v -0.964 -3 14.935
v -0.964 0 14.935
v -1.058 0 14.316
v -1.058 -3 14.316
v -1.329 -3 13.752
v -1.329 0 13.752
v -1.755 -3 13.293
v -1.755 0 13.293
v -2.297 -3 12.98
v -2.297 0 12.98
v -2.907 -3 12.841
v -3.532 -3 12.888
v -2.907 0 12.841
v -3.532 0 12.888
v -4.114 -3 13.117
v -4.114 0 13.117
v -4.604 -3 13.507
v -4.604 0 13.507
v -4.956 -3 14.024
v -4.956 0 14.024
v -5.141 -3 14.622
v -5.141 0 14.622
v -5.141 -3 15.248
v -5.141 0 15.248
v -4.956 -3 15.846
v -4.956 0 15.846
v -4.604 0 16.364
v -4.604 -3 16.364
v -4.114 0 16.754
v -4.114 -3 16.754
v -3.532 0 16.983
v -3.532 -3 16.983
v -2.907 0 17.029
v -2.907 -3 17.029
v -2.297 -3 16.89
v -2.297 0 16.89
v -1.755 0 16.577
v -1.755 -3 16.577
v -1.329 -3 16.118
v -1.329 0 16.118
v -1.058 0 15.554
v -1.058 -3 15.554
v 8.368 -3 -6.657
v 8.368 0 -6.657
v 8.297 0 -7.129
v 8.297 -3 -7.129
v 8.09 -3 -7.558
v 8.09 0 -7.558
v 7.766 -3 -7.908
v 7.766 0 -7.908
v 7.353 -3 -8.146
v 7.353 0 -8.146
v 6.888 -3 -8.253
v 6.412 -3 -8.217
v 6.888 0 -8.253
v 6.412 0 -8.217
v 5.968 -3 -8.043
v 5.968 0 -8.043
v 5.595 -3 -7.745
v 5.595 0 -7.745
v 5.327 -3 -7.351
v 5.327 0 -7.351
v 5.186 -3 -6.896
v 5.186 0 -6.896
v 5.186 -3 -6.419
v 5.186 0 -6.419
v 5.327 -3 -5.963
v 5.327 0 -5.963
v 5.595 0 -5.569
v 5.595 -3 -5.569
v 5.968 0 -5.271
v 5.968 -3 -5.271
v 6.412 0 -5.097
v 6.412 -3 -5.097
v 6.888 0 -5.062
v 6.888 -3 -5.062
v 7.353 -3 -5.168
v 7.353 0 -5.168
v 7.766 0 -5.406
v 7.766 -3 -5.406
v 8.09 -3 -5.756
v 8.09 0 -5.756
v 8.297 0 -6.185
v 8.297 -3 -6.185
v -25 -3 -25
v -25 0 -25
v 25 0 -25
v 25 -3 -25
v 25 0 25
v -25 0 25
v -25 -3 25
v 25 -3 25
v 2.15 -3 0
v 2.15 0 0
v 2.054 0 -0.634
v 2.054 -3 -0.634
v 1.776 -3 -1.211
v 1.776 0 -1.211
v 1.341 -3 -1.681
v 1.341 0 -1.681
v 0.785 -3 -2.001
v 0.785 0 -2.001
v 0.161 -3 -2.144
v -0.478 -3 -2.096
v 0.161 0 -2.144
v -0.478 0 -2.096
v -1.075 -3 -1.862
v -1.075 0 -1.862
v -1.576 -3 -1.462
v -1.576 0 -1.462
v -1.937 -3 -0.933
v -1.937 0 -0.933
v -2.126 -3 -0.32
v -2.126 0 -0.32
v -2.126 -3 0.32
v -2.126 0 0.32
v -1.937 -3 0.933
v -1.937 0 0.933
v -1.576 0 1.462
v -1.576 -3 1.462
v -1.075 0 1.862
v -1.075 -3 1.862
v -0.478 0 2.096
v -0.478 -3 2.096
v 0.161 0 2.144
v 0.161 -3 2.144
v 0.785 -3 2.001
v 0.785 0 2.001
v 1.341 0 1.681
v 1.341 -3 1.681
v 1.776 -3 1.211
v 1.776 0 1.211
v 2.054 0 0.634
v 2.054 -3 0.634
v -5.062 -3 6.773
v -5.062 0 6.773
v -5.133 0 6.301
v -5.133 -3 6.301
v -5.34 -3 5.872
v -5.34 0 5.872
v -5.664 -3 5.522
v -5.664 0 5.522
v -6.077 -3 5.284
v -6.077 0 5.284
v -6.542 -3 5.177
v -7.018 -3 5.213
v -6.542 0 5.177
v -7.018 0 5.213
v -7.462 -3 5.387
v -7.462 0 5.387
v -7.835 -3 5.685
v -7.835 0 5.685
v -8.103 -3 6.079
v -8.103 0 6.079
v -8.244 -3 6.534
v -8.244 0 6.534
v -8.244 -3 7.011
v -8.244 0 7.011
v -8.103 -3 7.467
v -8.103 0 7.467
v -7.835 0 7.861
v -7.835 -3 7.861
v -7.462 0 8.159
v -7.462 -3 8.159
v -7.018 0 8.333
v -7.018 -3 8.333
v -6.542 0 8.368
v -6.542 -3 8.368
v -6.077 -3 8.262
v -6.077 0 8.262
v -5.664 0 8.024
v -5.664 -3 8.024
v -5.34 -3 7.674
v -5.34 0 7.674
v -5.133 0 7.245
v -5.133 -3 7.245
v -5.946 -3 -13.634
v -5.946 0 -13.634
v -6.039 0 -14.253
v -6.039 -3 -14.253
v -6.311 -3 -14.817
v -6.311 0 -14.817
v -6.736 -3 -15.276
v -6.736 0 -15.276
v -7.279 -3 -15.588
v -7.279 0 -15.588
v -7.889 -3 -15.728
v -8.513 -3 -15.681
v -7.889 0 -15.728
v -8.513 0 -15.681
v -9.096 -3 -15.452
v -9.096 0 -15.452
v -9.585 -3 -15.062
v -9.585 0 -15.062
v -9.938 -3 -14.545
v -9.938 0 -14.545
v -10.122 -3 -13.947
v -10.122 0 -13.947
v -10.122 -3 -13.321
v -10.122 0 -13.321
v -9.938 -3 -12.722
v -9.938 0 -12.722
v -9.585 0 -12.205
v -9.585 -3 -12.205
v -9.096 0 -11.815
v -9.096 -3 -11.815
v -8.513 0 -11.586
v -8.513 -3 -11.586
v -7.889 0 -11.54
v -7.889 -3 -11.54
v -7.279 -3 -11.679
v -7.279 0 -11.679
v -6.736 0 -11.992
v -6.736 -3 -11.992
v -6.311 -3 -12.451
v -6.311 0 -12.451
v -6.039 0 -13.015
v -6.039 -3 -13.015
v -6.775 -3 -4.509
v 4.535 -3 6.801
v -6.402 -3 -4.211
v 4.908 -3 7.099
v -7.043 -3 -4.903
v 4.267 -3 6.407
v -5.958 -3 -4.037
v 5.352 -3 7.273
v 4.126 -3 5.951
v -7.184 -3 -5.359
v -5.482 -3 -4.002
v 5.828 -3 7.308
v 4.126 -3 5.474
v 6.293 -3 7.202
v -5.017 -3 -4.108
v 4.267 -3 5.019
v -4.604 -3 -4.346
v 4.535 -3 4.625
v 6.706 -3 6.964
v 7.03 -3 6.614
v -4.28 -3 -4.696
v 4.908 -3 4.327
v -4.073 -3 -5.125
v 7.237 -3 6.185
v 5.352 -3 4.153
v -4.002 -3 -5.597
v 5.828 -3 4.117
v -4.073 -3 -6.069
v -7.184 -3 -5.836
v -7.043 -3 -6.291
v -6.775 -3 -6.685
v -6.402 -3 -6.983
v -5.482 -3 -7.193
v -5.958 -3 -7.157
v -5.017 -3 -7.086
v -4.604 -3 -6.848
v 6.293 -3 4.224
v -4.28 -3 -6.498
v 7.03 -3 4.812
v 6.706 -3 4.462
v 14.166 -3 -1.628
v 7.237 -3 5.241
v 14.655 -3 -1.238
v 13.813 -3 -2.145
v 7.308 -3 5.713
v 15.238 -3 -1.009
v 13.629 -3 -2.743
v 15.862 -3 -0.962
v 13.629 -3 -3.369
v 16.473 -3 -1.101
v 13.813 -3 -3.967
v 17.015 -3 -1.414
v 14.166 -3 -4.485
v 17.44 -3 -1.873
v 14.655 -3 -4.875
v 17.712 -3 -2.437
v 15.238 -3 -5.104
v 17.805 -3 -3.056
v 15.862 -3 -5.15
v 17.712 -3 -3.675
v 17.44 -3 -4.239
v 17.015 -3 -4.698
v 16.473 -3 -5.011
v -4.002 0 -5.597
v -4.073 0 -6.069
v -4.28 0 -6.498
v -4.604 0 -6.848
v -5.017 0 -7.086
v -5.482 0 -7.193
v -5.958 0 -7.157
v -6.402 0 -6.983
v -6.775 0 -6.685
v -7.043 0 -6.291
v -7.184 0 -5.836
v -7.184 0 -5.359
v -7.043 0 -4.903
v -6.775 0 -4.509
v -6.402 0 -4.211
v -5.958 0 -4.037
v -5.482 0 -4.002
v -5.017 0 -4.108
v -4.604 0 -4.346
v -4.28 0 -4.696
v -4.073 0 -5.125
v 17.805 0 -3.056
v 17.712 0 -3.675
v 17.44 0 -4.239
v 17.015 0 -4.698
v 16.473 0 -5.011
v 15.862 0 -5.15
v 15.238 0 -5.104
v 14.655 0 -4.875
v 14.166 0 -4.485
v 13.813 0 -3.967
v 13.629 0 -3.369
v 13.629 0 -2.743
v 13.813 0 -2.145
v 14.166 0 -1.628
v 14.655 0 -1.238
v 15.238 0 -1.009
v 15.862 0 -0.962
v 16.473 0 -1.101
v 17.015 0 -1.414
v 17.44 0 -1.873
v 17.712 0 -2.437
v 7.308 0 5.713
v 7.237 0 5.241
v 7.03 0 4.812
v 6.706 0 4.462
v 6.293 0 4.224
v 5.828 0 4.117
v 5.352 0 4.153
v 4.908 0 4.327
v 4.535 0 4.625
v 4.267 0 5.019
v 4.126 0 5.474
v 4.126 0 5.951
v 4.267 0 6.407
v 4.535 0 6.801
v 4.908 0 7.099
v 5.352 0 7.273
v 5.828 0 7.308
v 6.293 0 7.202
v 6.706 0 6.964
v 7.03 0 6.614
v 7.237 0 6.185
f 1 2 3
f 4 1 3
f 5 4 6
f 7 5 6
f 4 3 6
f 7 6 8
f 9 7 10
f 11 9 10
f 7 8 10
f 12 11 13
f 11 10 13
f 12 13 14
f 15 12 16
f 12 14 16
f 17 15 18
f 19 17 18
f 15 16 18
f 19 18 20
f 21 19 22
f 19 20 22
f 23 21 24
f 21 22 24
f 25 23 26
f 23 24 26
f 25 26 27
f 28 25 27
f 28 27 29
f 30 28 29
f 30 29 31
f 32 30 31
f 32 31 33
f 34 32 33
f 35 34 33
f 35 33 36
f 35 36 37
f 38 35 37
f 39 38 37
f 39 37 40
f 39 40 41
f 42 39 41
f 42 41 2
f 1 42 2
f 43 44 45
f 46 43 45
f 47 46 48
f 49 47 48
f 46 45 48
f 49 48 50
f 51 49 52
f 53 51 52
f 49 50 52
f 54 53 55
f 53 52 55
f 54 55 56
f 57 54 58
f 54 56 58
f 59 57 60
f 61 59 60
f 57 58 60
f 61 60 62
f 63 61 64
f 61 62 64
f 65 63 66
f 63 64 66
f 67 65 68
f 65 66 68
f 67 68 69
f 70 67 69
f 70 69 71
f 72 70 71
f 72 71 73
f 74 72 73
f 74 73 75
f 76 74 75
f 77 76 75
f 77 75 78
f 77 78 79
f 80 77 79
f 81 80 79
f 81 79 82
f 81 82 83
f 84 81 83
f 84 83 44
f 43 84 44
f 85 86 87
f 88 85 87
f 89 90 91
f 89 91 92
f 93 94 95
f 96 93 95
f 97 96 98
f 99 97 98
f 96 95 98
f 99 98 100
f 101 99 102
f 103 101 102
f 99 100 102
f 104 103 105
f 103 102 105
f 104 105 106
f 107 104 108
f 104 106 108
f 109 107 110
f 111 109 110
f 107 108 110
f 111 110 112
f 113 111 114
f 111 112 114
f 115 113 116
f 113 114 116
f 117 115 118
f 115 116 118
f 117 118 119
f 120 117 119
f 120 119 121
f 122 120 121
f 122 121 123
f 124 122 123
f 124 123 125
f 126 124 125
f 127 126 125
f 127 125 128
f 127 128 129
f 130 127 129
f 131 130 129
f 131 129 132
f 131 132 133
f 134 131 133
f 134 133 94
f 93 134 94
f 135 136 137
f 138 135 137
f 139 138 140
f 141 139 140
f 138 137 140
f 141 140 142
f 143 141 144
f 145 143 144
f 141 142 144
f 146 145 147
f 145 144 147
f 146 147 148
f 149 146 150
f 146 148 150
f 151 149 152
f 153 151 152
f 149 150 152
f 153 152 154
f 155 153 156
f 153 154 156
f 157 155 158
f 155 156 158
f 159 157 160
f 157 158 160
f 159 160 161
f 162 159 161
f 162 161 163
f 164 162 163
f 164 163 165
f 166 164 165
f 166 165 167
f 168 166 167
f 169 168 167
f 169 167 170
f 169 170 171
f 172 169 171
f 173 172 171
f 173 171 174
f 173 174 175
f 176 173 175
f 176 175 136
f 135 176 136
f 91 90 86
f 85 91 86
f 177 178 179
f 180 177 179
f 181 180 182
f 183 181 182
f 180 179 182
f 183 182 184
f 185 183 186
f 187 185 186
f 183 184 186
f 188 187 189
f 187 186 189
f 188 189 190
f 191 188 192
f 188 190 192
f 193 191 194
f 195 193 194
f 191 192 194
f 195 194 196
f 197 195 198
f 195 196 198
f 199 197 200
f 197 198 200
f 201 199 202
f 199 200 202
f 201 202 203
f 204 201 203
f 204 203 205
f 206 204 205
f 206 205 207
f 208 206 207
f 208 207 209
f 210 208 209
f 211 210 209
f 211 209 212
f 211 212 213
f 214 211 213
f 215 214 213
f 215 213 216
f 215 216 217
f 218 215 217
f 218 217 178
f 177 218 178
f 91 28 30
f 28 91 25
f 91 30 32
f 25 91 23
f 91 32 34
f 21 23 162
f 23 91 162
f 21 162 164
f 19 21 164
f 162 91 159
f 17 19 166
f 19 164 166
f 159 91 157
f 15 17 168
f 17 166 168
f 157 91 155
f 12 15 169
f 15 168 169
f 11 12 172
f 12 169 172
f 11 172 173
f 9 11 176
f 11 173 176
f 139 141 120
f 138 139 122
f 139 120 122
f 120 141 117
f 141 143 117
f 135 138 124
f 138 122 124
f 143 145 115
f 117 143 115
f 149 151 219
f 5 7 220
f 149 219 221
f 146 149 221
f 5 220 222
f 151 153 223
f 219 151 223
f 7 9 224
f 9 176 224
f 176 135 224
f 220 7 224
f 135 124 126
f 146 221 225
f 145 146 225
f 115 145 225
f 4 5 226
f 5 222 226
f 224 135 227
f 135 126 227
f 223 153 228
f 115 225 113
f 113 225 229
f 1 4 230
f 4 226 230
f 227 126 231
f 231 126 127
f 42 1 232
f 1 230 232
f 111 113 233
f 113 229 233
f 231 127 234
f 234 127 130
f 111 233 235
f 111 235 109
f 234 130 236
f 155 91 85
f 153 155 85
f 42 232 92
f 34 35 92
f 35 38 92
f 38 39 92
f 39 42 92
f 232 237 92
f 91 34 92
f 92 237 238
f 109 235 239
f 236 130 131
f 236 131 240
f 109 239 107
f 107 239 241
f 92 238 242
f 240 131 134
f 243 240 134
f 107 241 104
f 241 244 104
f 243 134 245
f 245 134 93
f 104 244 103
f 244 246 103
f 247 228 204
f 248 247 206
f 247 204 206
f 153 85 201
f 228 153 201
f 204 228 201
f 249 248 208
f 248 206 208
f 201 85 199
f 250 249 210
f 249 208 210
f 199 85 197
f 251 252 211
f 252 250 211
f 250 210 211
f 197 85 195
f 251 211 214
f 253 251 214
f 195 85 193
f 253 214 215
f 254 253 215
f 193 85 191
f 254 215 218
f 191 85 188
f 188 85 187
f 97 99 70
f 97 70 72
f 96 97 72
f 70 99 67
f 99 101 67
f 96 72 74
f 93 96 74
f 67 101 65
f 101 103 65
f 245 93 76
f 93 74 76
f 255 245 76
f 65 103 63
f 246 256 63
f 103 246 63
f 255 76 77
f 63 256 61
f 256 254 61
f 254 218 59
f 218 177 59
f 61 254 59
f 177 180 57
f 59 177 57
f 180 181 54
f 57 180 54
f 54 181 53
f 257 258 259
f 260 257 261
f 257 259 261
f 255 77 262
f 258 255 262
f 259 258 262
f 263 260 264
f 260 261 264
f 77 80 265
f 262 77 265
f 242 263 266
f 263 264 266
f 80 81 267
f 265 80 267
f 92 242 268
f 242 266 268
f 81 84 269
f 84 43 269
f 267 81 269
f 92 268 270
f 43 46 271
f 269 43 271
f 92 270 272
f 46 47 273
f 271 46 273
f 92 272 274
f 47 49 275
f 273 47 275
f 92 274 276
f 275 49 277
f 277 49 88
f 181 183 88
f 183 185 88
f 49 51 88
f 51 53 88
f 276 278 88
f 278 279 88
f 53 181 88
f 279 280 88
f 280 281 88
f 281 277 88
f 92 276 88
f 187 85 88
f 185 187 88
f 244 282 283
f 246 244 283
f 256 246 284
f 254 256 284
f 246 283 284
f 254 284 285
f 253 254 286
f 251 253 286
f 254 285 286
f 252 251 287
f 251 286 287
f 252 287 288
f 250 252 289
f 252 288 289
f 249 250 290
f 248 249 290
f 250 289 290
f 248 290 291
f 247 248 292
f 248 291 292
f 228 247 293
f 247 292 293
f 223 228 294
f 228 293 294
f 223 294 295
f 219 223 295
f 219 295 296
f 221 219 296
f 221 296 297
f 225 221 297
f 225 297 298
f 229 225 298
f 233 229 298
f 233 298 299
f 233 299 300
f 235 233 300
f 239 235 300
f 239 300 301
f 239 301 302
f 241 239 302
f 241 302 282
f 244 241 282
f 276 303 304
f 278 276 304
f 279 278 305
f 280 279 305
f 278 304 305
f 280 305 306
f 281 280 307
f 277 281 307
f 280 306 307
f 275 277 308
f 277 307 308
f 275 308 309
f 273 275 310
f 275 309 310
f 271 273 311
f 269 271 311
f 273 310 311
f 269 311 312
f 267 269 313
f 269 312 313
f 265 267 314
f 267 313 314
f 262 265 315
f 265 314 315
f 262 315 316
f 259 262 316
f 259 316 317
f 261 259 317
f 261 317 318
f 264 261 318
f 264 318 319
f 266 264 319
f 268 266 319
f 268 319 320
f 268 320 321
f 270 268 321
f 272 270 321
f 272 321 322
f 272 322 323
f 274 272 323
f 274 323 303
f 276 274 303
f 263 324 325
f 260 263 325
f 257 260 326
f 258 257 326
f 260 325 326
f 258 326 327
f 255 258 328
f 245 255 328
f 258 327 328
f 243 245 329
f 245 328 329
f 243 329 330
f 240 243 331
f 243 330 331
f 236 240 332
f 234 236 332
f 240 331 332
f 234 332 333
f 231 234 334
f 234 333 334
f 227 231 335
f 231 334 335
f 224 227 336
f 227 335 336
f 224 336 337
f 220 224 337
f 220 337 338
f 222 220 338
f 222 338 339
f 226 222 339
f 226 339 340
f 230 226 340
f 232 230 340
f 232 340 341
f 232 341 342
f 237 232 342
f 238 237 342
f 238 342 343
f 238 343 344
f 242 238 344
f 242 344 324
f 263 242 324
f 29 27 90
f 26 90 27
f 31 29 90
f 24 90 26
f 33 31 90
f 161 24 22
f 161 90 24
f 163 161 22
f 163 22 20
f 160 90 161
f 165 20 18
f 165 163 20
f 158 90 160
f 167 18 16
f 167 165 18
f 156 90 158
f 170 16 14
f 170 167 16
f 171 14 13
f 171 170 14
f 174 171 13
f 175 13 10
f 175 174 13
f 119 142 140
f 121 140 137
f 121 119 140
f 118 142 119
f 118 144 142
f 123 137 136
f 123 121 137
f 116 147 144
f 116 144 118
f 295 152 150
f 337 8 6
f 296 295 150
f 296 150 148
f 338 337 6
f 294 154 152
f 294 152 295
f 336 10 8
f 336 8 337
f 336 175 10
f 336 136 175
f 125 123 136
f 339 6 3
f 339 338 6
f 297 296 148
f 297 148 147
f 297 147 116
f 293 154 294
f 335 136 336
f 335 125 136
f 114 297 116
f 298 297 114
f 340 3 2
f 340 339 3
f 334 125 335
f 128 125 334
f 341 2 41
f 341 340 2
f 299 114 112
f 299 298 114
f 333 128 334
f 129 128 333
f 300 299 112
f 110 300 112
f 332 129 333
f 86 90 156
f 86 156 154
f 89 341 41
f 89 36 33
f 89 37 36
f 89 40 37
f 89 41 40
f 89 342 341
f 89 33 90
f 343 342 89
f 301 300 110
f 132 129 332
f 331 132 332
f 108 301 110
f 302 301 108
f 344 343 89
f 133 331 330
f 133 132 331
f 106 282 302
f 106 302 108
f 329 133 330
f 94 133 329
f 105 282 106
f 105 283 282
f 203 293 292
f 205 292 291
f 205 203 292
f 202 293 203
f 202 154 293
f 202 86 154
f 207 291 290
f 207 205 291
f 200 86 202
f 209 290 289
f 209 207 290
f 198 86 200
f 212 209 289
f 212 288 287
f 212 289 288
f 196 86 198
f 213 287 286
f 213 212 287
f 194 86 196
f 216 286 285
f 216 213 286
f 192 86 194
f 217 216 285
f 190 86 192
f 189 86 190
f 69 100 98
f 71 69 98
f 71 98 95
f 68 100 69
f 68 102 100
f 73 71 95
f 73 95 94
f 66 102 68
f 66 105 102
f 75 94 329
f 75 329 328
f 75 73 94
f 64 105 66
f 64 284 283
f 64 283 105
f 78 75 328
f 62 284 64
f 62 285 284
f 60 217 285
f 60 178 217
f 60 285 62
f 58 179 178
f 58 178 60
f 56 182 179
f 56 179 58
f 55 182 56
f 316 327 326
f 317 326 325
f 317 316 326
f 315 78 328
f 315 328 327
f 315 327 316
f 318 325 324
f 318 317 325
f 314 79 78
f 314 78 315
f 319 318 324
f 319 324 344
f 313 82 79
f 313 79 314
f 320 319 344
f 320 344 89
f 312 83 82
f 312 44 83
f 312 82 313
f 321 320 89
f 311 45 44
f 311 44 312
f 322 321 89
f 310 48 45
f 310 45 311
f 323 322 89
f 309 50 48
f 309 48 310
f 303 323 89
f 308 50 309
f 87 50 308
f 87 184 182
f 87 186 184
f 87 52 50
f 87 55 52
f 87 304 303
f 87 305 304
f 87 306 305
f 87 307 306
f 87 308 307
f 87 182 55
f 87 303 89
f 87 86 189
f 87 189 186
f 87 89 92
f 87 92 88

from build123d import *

# Parameters (mm, degrees)
SKETCH1_W           = 50
SKETCH1_H           = 50
BOSS_EXTRUDE1_DEPTH = 3
SKETCH2_R           = 2.15
CUT_EXTRUDE1_DEPTH  = 4
SKETCH3_R           = 1.6
CUT_EXTRUDE2_DEPTH  = 4
SKETCH4_R           = 2.1
CUT_EXTRUDE3_DEPTH  = 4


with BuildPart() as part:
    # Sketch1 → Boss-Extrude1 (new body)
    with BuildSketch(Plane(origin=(0, 0, 0), x_dir=(1, 0, 0), z_dir=(0, 1, 0))):
        Rectangle(SKETCH1_W, SKETCH1_H)
    extrude(amount=-BOSS_EXTRUDE1_DEPTH)

    # Sketch2 → Cut-Extrude1 (cut, through all)
    with BuildSketch(Plane(origin=(0, 0, 0), x_dir=(1, 0, 0), z_dir=(0, 1, 0))):
        Circle(SKETCH2_R)
    extrude(amount=-CUT_EXTRUDE1_DEPTH, mode=Mode.SUBTRACT)

    # Sketch3 → Cut-Extrude2 (cut, through all)
    with BuildSketch(Plane(origin=(0, 0, 0), x_dir=(1, 0, 0), z_dir=(0, 1, 0))):
        with Locations((6.768353811, 6.657078174)):
            Circle(SKETCH3_R)
        with Locations((-6.661646189, -6.772921826)):
            Circle(SKETCH3_R)
        with Locations((-5.601646189, 5.597078174)):
            Circle(SKETCH3_R)
        with Locations((5.708353811, -5.712921826)):
            Circle(SKETCH3_R)
    extrude(amount=-CUT_EXTRUDE2_DEPTH, mode=Mode.SUBTRACT)

    # Sketch4 → Cut-Extrude3 (cut, through all)
    with BuildSketch(Plane(origin=(0, 0, 0), x_dir=(1, 0, 0), z_dir=(0, 1, 0))):
        with Locations((15.70537943, 3.056314275)):
            Circle(SKETCH4_R)
        with Locations((-3.064333665, -14.935291276)):
            Circle(SKETCH4_R)
        with Locations((-8.045828007, 13.633655399)):
            Circle(SKETCH4_R)
    extrude(amount=-CUT_EXTRUDE3_DEPTH, mode=Mode.SUBTRACT)


solid = part.part
